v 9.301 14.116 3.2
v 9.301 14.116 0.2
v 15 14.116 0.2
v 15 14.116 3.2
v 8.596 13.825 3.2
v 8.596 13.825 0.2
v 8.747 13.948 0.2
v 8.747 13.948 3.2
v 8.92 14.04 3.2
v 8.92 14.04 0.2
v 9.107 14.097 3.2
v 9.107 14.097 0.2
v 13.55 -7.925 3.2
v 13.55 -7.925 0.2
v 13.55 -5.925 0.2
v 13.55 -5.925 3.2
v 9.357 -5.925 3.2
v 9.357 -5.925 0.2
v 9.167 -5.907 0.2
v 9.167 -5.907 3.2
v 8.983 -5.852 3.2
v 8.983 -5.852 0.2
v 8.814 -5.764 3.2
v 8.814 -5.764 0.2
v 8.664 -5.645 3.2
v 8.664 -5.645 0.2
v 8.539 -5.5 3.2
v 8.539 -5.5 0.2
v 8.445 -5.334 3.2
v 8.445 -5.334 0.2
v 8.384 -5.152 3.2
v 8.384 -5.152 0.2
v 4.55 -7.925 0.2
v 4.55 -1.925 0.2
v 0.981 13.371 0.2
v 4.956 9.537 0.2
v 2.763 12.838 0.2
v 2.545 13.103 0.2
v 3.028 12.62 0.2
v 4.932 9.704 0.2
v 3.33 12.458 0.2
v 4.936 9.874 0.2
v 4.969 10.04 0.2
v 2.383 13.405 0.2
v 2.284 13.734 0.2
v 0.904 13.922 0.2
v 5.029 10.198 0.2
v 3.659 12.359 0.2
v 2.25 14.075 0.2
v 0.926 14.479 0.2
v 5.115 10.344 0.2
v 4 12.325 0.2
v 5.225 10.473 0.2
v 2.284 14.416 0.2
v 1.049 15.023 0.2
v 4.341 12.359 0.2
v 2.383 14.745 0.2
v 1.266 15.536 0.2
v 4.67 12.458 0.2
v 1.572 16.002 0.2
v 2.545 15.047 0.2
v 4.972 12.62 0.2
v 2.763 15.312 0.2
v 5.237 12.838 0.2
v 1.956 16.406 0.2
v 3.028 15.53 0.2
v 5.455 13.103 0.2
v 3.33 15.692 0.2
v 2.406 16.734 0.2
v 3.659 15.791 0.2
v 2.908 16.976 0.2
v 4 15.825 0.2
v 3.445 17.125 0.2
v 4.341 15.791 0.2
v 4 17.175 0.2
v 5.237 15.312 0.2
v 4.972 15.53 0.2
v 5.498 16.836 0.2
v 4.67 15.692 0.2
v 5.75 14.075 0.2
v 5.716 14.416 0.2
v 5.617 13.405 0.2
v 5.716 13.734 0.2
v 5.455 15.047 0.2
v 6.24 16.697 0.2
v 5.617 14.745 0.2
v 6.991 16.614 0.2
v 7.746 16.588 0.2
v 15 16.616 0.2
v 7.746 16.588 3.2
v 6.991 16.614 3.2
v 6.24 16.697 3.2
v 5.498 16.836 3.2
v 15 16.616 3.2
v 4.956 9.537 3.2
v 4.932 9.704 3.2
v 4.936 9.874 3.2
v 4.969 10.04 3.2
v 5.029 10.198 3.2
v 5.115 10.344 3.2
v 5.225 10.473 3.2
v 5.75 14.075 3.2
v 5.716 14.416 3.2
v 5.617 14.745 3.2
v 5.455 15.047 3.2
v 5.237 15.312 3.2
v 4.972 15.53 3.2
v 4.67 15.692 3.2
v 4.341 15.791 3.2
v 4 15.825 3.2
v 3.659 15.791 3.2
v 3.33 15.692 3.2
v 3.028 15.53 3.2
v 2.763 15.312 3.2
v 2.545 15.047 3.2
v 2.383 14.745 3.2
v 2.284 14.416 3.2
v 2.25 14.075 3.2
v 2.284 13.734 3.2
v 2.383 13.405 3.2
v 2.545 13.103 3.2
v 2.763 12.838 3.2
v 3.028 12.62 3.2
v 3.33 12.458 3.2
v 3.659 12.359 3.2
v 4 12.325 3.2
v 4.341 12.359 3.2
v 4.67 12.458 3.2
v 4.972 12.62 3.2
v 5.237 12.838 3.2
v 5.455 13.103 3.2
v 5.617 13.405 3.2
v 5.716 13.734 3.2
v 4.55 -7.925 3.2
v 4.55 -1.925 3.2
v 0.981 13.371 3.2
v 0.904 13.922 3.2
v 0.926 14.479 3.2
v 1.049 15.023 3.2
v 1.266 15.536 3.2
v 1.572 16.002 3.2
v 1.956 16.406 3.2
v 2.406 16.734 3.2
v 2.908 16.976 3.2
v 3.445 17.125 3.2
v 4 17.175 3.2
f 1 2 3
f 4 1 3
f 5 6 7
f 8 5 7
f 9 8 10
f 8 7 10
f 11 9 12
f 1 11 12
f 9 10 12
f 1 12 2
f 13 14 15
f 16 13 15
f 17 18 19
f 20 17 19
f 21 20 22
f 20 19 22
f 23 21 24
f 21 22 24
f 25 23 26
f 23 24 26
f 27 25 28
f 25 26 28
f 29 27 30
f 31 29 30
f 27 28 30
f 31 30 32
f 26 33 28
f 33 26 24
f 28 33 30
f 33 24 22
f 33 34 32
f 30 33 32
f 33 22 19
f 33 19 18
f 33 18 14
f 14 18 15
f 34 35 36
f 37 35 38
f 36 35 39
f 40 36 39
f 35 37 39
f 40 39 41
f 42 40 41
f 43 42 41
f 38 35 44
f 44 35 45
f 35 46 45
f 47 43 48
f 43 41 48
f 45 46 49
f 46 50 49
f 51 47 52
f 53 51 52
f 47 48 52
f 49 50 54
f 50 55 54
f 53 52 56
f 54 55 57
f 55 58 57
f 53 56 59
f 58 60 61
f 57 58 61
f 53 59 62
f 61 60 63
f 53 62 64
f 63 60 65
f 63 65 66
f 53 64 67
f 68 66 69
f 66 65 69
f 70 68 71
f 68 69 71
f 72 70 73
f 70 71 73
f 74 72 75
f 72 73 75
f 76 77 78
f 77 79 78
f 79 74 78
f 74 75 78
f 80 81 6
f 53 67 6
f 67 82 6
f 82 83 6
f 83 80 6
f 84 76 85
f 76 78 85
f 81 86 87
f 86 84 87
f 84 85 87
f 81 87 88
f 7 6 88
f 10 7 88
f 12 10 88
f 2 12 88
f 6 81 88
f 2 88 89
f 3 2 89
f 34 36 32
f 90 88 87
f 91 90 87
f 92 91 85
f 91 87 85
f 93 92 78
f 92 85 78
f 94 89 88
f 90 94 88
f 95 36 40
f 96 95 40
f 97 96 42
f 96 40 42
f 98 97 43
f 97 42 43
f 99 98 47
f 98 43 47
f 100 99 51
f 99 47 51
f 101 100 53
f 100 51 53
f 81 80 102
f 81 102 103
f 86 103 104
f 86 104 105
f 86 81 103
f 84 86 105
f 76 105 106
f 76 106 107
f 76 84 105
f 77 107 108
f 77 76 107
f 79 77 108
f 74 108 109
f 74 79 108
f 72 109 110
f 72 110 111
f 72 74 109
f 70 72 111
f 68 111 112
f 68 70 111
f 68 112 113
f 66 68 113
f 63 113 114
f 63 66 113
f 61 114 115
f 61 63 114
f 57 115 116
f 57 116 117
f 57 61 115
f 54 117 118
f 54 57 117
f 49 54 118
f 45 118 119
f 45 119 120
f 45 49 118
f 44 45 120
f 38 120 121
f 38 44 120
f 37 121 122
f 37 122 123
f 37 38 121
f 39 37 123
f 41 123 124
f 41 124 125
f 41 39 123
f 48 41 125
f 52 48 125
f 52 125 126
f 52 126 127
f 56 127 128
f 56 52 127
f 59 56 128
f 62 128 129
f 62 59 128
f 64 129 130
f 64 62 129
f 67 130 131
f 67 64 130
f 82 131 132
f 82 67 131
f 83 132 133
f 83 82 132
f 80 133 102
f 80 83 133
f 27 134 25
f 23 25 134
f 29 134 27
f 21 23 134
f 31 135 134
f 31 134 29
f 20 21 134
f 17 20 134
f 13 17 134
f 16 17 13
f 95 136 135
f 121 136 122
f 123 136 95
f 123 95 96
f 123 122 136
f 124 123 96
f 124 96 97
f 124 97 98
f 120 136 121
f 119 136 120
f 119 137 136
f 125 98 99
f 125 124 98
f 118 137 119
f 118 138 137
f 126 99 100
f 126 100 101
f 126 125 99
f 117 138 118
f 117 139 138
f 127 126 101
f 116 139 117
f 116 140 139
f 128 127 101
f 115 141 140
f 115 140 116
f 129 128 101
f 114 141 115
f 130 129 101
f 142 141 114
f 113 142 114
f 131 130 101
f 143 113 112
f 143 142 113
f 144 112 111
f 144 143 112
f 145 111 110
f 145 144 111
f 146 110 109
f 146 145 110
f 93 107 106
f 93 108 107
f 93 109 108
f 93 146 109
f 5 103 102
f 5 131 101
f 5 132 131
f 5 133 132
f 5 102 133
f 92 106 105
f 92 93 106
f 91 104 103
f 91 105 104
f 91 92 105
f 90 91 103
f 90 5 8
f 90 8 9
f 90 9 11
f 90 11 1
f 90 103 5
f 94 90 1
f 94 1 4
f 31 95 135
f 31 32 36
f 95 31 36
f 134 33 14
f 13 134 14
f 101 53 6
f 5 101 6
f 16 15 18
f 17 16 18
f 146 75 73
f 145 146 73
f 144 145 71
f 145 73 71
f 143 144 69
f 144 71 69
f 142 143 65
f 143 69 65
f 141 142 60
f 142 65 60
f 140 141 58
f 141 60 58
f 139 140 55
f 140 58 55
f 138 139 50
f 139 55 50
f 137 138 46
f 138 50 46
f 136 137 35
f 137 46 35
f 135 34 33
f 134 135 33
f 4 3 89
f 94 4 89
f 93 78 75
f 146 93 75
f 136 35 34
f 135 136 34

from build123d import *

# Parameters (mm, degrees)
BOSS_EXTRU_1_START = 0.2
ESQUISSE1_R        = 1.75
BOSS_EXTRU_1_DEPTH = 3


with BuildPart() as part:
    # Esquisse1 → Boss.-Extru.1 (new body)
    with BuildSketch(Plane.XY.offset(BOSS_EXTRU_1_START)):
        with BuildLine():
            Line((0.981089506, 13.370599952), (4.55, -1.925))
            Line((4.55, -1.925), (4.55, -7.925))
            Line((4.55, -7.925), (13.55, -7.925))
            Line((13.55, -7.925), (13.55, -5.925))
            Line((13.55, -5.925), (9.357429757, -5.925))
            ThreePointArc((9.357429757, -5.925), (8.735829332, -5.708334482), (8.383587662, -5.152225822))
            Line((8.383587662, -5.152225822), (4.956202513, 9.536826262))
            ThreePointArc((4.956202513, 9.536826262), (4.968859947, 10.039957952), (5.224987097, 10.473202214))
            Line((5.224987097, 10.473202214), (8.596002843, 13.824763284))
            ThreePointArc((8.596002843, 13.824763284), (8.91971414, 14.040045447), (9.301060354, 14.115613154))
            Line((9.301060354, 14.115613154), (15, 14.115613154))
            Line((15, 14.115613154), (15, 16.615613154))
            Line((15, 16.615613154), (7.745530511, 16.588352798))
            ThreePointArc((7.745530511, 16.588352798), (6.614685245, 16.648223613), (5.49786, 16.835565296))
            Line((5.49786, 16.835565296), (4, 17.175))
            ThreePointArc((4, 17.175), (1.571663105, 16.001961319), (0.981089506, 13.370599952))
        make_face()
        with Locations((4, 14.075)):
            Circle(ESQUISSE1_R, mode=Mode.SUBTRACT)
    extrude(amount=BOSS_EXTRU_1_DEPTH)


solid = part.part
